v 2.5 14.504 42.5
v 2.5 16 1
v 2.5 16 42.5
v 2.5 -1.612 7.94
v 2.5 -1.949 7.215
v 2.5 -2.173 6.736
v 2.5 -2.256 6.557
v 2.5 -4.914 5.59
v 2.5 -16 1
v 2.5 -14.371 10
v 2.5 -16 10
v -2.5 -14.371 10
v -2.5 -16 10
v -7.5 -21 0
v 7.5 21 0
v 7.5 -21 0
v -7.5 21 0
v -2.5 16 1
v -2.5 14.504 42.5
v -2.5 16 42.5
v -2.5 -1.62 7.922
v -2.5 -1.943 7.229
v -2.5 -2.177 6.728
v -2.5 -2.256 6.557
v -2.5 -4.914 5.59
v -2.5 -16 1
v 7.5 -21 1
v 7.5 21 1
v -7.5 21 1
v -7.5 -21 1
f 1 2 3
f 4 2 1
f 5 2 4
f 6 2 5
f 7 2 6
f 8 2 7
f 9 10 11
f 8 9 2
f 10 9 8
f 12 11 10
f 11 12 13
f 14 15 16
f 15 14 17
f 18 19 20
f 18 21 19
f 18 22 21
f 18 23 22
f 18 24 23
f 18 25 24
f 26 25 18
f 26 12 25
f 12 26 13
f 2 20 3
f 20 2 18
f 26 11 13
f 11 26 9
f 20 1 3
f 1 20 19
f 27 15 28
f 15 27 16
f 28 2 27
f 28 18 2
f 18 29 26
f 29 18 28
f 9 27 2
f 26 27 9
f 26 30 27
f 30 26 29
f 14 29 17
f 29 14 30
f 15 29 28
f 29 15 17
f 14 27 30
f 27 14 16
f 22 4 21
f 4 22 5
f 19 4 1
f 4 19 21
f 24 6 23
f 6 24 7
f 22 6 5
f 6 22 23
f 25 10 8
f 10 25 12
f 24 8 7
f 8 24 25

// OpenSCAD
// file: ../parameters.scad
/*
 * SPDX-FileCopyrightText: © 2023 Brian S. Stephan <bss@incorporeal.org>
 * SPDX-License-Identifier: GPL-3.0-or-later
 */

// adjustments
hole_tolerance = 0.15;

// M2
m2_screw_selftap_radius = 0.95;

// M3
m3_screw_selftap_radius = 1.3;

// M4
m4_bolt_radius = 2 + hole_tolerance;
m4_bolt_countersink_radius = 6.1 + hole_tolerance;
m4_bolt_hex_exterior_radius = 3.6 + hole_tolerance;

// 24mm button
small_button_radius = 12 + hole_tolerance;

// 30mm button
big_button_radius = 15 + hole_tolerance;

// JLF mount dimensions
lever_mount_x = 53;
lever_mount_y = 95;
lever_mount_z = 2;

// standard lever hole
lever_plate_hole = 12;

// case dimensions
// base frame box. reminder: top of inside (including mounts) is chopped by panel_z for plates
frame_x = 233;
frame_y = 208;
frame_z = 57;

// stand dimensions to display a stick
stand_x = 5;
stand_y = frame_z-25;
stand_z = 10;

// degree to which the extended frame pieces stick out from the end of the frame
frame_extension_x = 25;
frame_extension_y = 25;

// this sinks the bottom and top of the frame inward a bit, and is used to math out two shapes
// when creating the frame box / overhang panel
frame_bevel_height = 2;
overhang_panel_bevel_height = 1;

frame_center_to_neutrik = 70;

// depth of the "lip" of the frame that the top plate sets into/supports the overhang
frame_wall = 4;

// width of the column in the frame corners to support the hex bolt
frame_mount_column_width = 20;

// per neutrik (mm)
neutrik_panel_thickness = 3;

// top plate, which can either be the whole plate ("inset") or the mounting frame for a plate that overhangs
panel_x = frame_x - (frame_wall * 2);
panel_y = frame_y - (frame_wall * 2);
panel_z = 5;

// how much the top plate x/y is expanded to overhang the frame
// note that this is relative to the top plate (so the wall is added back)
panel_overhang_amount = 8.5;
overhang_panel_x = panel_x + (frame_wall * 2) + (panel_overhang_amount * 2);
overhang_panel_y = panel_y + (frame_wall * 2) + (panel_overhang_amount * 2);

panel_to_frame_point_x = (panel_x/2)-10;
panel_to_frame_point_y = (panel_y/2)-10;

// frame interior that supports the top plates
panel_support_width = 5;

// neutrik D screw holes
neutrik_d_screw_radius = 1.6 + hole_tolerance;
neutrik_d_radius = 12 + hole_tolerance;

// additional button radius for decorative panels, etc.
decorative_radius_scale = 1.75;
jumbo_decorative_radius_scale = 2;
// main file
/*
 * SPDX-FileCopyrightText: © 2024 Brian S. Stephan <bss@incorporeal.org>
 * SPDX-License-Identifier: GPL-3.0-or-later
 */

include <../parameters.scad>
include <../components.scad>

base_extra = 10;
back_extra_multiplier = 4.25;
rotation_alignment = 15;

module stand() {
	difference() {
		union() {
			/* front lip piece */
			translate([0, 0, stand_z/2]) cube([stand_x, stand_y, stand_z], center=true);
			/* back supporting piece */
			translate([0, (stand_y-rotation_alignment)/4, stand_z*back_extra_multiplier/2])
				cube([stand_x, (stand_y+rotation_alignment)/2, stand_z*back_extra_multiplier], center=true);
			/* base */
			translate([0, 0, 0.5]) cube([stand_x+base_extra, stand_y+base_extra, 1], center=true);
		}
		/* cut out the actual frame solid */
		translate([0, rotation_alignment, (frame_y/2)+7]) rotate([65, 0, 0]) frame_solid();
	}
}

stand();
